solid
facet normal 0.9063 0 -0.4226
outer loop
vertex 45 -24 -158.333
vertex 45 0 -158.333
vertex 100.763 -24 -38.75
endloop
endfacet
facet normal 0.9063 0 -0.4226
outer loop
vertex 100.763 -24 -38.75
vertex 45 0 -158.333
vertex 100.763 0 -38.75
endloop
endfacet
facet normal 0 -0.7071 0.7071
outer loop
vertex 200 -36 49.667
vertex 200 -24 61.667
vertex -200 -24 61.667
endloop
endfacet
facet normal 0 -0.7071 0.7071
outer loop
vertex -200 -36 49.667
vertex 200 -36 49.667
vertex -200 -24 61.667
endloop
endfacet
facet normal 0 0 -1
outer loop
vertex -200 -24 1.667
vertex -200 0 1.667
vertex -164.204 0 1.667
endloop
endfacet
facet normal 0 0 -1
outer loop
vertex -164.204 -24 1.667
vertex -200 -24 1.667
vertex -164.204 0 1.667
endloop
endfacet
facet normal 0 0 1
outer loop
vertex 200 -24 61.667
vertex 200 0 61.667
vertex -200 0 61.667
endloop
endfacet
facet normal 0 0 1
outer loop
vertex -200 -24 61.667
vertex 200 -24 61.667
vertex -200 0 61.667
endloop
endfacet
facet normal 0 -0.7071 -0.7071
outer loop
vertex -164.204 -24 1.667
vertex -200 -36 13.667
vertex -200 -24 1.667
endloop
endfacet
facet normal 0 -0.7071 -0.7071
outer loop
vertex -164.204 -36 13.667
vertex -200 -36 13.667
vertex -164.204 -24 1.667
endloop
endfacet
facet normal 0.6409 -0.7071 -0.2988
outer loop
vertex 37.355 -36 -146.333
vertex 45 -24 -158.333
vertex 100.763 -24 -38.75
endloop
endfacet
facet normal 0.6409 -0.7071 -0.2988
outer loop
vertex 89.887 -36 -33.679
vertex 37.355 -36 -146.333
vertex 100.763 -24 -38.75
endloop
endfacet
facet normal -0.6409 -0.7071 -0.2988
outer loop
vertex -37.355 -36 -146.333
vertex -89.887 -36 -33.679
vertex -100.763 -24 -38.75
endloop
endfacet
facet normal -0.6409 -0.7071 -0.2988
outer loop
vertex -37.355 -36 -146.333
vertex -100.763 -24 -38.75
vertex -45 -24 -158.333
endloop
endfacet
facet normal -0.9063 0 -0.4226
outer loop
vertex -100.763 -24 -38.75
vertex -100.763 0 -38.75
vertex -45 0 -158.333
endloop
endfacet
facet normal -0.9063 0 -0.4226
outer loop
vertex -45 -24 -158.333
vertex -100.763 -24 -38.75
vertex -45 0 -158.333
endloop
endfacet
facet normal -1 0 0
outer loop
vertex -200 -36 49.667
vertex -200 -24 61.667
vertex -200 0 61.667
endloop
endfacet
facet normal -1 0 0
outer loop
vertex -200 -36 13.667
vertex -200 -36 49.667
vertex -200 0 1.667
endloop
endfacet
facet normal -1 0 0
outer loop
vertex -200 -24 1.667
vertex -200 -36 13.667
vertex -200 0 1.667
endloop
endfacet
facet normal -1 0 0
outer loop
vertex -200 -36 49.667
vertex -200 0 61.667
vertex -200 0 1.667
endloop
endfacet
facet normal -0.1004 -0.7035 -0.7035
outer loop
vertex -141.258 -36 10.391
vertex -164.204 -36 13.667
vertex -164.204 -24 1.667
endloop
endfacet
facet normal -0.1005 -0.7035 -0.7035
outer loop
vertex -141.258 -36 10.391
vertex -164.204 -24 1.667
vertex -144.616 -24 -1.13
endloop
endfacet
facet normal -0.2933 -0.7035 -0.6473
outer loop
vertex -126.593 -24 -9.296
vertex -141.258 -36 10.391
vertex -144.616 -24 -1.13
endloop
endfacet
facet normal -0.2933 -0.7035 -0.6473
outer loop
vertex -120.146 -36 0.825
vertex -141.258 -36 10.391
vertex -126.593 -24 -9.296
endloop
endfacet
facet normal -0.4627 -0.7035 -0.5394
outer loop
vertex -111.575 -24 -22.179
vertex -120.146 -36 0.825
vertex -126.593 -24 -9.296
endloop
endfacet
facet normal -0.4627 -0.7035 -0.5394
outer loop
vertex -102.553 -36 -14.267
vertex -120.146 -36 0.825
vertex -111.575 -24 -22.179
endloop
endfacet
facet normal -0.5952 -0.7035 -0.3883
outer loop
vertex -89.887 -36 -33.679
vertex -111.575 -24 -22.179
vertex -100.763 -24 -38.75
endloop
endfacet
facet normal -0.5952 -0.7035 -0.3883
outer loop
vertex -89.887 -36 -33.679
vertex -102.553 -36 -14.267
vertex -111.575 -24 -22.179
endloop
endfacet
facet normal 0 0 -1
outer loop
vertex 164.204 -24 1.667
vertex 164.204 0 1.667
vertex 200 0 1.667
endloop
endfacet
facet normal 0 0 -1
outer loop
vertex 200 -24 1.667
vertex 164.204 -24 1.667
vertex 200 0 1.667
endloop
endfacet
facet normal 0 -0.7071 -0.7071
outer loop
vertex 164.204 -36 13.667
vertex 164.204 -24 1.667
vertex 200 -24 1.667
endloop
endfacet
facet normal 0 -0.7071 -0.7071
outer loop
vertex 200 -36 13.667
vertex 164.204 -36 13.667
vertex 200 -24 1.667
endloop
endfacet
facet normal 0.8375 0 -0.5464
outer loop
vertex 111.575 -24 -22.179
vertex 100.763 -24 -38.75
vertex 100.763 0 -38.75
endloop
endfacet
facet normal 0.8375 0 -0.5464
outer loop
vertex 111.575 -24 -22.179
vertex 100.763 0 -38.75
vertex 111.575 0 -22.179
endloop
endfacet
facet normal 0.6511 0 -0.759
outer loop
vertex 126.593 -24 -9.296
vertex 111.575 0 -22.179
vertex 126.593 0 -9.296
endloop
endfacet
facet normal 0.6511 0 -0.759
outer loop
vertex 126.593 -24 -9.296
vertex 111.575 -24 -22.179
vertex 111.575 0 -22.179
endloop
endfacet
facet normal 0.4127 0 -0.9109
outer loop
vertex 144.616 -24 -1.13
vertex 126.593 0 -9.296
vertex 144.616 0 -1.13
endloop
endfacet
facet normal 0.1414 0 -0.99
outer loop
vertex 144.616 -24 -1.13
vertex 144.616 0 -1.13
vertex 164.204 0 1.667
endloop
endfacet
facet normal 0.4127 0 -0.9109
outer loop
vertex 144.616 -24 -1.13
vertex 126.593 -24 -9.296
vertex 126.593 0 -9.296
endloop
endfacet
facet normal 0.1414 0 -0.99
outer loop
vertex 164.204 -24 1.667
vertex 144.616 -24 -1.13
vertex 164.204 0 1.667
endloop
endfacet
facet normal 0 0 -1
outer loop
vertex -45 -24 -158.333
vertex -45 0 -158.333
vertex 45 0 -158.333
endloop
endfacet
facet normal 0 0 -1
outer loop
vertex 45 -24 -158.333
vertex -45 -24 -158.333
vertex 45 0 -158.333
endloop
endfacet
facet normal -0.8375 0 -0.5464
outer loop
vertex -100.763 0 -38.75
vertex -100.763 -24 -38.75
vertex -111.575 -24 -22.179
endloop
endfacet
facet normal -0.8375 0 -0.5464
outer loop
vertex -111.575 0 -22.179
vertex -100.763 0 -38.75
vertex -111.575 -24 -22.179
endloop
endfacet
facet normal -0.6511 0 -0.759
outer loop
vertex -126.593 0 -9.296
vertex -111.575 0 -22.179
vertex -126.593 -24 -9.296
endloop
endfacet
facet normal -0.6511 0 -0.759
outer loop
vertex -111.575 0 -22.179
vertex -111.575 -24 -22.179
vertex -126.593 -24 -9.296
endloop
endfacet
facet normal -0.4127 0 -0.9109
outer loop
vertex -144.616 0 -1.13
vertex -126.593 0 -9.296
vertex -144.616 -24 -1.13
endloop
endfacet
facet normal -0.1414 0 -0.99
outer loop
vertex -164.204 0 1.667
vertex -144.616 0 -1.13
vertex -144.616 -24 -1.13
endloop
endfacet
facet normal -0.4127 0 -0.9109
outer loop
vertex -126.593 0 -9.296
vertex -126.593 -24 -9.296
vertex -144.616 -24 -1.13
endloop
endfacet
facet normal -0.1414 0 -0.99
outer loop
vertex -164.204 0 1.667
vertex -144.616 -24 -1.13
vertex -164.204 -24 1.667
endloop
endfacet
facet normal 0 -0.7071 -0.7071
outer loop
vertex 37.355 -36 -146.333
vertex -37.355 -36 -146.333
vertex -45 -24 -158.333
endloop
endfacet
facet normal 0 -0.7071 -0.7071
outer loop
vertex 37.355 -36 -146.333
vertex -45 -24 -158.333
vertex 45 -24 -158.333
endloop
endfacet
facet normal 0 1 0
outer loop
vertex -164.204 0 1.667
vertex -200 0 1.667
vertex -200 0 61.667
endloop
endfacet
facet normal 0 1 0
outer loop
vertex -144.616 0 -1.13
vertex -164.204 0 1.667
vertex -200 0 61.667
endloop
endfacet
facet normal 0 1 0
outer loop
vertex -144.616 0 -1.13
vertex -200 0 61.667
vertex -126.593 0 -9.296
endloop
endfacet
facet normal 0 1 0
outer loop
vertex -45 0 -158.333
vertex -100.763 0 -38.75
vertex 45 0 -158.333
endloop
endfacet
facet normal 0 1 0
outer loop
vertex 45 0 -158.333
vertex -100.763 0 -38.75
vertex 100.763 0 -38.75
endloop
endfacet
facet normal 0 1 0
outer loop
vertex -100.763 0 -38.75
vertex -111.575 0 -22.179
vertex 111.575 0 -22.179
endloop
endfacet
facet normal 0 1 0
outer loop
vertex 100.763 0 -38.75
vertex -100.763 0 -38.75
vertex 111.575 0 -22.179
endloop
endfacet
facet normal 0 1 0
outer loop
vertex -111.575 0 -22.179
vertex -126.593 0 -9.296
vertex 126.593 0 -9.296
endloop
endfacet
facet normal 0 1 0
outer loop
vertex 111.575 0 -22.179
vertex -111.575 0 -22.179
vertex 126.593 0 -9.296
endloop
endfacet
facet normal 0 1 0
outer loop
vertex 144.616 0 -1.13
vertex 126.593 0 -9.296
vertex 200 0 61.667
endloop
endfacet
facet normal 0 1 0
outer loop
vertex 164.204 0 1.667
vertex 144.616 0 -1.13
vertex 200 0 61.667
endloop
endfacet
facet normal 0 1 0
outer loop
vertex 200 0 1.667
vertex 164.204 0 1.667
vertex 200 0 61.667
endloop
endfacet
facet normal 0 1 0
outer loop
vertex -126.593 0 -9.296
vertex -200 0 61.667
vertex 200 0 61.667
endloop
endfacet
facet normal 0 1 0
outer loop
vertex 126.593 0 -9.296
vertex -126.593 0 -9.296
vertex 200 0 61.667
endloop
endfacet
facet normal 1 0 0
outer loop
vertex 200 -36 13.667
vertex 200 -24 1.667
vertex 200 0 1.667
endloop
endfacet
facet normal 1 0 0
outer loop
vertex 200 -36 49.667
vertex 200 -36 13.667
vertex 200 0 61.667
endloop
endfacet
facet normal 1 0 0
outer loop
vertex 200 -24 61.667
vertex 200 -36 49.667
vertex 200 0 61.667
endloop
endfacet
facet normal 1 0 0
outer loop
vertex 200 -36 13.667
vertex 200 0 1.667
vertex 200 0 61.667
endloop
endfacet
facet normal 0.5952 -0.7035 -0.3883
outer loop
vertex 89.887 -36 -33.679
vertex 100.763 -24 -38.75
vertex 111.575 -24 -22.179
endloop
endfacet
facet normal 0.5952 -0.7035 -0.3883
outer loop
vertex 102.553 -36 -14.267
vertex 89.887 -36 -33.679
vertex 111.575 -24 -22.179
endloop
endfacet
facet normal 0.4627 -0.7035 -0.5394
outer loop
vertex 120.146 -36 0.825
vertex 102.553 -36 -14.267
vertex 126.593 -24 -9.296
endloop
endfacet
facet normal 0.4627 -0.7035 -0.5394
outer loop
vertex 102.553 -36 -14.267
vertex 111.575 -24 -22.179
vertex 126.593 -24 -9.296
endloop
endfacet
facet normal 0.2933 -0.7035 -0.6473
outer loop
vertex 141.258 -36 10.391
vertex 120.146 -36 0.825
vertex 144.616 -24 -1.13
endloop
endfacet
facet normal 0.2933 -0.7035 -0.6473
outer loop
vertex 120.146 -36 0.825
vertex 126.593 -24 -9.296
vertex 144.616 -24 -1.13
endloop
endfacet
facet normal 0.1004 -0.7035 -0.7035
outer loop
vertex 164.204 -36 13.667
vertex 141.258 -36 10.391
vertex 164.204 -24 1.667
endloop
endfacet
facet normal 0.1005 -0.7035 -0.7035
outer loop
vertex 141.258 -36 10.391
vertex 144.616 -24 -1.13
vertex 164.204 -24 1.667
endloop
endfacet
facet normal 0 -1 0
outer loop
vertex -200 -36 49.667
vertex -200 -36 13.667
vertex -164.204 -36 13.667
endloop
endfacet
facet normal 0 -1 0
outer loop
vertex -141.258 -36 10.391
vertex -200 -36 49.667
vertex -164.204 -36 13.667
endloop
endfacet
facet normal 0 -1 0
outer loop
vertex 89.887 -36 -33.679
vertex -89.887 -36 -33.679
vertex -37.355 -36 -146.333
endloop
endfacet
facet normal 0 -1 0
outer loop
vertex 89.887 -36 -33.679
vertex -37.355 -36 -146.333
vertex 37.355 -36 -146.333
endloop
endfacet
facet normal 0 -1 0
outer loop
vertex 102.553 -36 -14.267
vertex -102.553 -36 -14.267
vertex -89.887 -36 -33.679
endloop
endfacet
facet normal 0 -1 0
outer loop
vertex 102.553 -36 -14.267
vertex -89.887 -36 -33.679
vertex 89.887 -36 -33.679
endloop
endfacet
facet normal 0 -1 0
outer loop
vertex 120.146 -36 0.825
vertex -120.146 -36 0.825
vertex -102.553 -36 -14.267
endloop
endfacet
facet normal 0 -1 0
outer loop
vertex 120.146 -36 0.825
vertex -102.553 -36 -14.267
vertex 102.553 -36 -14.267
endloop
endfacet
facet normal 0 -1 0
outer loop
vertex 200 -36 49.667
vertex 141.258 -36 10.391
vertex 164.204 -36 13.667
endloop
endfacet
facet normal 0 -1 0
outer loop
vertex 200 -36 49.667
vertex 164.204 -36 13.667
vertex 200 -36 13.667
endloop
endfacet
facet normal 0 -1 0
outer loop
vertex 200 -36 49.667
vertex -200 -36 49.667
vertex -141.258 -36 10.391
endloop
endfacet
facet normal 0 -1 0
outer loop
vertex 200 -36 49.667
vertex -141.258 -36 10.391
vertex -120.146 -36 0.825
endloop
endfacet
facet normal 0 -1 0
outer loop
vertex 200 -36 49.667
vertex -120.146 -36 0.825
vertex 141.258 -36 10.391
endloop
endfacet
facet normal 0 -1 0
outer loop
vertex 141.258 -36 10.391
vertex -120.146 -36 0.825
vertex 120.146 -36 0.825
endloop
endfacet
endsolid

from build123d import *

# Parameters (mm, degrees)
F1_DEPTH = 36
F2_R     = 70
F3_SIZE  = 12


with BuildPart() as f1:
    # F0 (on Front) → F1 (new body)
    with BuildSketch(Plane.XZ):
        Polygon((-119.609225, 1.666667), (-45, -158.333333), (45, -158.333333), (119.609225, 1.666667), (200, 1.666667), (200, 61.666667), (-200, 61.666667), (-200, 1.666667), align=None)
    extrude(amount=F1_DEPTH)

    # F2
    f2_edges = [f1.edges().sort_by_distance(p)[0] for p in [
        (119.609225, -18, 1.666667),
        (-119.609225, -18, 1.666667),
    ]]
    fillet(f2_edges, radius=F2_R)

    # F3
    f3_edges = [f1.edges().sort_by_distance(p)[0] for p in [
        (0, -36, 61.666667),
        (182.102072, -36, 1.666667),
        (-72.881299, -36, -98.541694),
        (0, -36, -158.333333),
    ]]
    chamfer(f3_edges, length=F3_SIZE)


solid = f1.part
